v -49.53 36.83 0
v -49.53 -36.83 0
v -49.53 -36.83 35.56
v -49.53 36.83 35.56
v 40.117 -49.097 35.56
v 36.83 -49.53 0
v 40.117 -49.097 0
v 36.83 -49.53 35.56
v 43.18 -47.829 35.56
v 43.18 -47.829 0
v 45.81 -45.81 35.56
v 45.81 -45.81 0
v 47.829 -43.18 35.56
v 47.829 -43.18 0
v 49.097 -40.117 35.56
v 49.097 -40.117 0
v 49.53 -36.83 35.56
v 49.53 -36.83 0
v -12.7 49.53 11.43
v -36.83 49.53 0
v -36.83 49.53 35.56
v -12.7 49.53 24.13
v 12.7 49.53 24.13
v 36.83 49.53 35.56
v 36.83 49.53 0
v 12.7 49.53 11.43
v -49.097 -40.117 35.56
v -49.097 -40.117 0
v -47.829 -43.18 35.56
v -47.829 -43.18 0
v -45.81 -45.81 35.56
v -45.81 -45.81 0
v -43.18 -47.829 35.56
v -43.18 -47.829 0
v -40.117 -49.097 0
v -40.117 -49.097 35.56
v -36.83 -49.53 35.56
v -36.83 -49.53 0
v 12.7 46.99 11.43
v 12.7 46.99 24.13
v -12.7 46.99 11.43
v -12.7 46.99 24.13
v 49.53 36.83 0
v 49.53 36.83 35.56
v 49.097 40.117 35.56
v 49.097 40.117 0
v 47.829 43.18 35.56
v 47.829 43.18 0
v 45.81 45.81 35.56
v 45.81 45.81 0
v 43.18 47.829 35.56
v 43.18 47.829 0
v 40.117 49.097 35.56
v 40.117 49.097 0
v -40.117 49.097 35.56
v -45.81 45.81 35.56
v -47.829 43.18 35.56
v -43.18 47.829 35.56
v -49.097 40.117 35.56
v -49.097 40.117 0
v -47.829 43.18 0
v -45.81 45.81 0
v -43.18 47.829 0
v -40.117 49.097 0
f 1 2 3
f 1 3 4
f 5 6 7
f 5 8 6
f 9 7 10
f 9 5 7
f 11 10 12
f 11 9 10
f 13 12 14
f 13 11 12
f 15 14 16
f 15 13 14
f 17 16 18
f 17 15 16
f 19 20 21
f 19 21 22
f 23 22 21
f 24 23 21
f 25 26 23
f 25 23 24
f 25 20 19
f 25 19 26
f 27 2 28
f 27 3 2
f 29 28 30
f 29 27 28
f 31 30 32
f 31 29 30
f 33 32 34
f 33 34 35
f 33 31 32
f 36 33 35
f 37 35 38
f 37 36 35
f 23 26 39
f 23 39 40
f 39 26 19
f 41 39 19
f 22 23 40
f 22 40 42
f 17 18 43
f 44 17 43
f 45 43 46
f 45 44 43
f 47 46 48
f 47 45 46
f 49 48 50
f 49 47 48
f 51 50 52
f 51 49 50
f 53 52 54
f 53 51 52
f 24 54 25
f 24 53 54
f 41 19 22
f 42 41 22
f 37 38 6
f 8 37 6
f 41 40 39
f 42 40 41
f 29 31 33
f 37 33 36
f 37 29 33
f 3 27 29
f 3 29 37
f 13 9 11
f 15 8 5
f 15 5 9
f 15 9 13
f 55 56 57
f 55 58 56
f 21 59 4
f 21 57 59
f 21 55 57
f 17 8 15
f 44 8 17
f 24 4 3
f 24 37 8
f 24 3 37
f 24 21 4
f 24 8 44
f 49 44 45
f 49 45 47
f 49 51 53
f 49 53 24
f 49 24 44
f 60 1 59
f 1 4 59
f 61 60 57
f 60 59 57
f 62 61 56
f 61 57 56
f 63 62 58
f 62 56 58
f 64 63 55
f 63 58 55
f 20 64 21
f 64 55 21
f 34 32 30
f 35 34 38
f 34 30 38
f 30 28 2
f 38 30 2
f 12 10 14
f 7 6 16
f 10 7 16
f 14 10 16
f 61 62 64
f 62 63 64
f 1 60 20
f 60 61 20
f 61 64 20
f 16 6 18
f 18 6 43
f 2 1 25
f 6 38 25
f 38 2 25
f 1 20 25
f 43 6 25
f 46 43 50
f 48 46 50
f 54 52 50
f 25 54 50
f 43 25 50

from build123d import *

# Parameters (mm, degrees)
F0_W     = 99.06
F0_H     = 99.06
F1_DEPTH = 35.56
F2_R     = 12.7
F3_W     = 25.4
F3_H     = 12.7
F4_DEPTH = 2.54


with BuildPart() as f1:
    # F0 (on Top) → F1 (new body)
    with BuildSketch(Plane.XY):
        Rectangle(F0_W, F0_H)
    extrude(amount=F1_DEPTH)

    # F2
    f2_edges = [f1.edges().sort_by_distance(p)[0] for p in [
        (49.53, -49.53, 17.78),
        (49.53, 49.53, 17.78),
        (-49.53, -49.53, 17.78),
        (-49.53, 49.53, 17.78),
    ]]
    fillet(f2_edges, radius=F2_R)

    # F3 (on face) → F4 (cut)
    with BuildSketch(Plane(origin=(0, 49.53, 0), x_dir=(-1, 0, 0), z_dir=(0, 1, 0))):
        with Locations((0, 17.78)):
            Rectangle(F3_W, F3_H)
    extrude(amount=-F4_DEPTH, mode=Mode.SUBTRACT)


solid = f1.part
